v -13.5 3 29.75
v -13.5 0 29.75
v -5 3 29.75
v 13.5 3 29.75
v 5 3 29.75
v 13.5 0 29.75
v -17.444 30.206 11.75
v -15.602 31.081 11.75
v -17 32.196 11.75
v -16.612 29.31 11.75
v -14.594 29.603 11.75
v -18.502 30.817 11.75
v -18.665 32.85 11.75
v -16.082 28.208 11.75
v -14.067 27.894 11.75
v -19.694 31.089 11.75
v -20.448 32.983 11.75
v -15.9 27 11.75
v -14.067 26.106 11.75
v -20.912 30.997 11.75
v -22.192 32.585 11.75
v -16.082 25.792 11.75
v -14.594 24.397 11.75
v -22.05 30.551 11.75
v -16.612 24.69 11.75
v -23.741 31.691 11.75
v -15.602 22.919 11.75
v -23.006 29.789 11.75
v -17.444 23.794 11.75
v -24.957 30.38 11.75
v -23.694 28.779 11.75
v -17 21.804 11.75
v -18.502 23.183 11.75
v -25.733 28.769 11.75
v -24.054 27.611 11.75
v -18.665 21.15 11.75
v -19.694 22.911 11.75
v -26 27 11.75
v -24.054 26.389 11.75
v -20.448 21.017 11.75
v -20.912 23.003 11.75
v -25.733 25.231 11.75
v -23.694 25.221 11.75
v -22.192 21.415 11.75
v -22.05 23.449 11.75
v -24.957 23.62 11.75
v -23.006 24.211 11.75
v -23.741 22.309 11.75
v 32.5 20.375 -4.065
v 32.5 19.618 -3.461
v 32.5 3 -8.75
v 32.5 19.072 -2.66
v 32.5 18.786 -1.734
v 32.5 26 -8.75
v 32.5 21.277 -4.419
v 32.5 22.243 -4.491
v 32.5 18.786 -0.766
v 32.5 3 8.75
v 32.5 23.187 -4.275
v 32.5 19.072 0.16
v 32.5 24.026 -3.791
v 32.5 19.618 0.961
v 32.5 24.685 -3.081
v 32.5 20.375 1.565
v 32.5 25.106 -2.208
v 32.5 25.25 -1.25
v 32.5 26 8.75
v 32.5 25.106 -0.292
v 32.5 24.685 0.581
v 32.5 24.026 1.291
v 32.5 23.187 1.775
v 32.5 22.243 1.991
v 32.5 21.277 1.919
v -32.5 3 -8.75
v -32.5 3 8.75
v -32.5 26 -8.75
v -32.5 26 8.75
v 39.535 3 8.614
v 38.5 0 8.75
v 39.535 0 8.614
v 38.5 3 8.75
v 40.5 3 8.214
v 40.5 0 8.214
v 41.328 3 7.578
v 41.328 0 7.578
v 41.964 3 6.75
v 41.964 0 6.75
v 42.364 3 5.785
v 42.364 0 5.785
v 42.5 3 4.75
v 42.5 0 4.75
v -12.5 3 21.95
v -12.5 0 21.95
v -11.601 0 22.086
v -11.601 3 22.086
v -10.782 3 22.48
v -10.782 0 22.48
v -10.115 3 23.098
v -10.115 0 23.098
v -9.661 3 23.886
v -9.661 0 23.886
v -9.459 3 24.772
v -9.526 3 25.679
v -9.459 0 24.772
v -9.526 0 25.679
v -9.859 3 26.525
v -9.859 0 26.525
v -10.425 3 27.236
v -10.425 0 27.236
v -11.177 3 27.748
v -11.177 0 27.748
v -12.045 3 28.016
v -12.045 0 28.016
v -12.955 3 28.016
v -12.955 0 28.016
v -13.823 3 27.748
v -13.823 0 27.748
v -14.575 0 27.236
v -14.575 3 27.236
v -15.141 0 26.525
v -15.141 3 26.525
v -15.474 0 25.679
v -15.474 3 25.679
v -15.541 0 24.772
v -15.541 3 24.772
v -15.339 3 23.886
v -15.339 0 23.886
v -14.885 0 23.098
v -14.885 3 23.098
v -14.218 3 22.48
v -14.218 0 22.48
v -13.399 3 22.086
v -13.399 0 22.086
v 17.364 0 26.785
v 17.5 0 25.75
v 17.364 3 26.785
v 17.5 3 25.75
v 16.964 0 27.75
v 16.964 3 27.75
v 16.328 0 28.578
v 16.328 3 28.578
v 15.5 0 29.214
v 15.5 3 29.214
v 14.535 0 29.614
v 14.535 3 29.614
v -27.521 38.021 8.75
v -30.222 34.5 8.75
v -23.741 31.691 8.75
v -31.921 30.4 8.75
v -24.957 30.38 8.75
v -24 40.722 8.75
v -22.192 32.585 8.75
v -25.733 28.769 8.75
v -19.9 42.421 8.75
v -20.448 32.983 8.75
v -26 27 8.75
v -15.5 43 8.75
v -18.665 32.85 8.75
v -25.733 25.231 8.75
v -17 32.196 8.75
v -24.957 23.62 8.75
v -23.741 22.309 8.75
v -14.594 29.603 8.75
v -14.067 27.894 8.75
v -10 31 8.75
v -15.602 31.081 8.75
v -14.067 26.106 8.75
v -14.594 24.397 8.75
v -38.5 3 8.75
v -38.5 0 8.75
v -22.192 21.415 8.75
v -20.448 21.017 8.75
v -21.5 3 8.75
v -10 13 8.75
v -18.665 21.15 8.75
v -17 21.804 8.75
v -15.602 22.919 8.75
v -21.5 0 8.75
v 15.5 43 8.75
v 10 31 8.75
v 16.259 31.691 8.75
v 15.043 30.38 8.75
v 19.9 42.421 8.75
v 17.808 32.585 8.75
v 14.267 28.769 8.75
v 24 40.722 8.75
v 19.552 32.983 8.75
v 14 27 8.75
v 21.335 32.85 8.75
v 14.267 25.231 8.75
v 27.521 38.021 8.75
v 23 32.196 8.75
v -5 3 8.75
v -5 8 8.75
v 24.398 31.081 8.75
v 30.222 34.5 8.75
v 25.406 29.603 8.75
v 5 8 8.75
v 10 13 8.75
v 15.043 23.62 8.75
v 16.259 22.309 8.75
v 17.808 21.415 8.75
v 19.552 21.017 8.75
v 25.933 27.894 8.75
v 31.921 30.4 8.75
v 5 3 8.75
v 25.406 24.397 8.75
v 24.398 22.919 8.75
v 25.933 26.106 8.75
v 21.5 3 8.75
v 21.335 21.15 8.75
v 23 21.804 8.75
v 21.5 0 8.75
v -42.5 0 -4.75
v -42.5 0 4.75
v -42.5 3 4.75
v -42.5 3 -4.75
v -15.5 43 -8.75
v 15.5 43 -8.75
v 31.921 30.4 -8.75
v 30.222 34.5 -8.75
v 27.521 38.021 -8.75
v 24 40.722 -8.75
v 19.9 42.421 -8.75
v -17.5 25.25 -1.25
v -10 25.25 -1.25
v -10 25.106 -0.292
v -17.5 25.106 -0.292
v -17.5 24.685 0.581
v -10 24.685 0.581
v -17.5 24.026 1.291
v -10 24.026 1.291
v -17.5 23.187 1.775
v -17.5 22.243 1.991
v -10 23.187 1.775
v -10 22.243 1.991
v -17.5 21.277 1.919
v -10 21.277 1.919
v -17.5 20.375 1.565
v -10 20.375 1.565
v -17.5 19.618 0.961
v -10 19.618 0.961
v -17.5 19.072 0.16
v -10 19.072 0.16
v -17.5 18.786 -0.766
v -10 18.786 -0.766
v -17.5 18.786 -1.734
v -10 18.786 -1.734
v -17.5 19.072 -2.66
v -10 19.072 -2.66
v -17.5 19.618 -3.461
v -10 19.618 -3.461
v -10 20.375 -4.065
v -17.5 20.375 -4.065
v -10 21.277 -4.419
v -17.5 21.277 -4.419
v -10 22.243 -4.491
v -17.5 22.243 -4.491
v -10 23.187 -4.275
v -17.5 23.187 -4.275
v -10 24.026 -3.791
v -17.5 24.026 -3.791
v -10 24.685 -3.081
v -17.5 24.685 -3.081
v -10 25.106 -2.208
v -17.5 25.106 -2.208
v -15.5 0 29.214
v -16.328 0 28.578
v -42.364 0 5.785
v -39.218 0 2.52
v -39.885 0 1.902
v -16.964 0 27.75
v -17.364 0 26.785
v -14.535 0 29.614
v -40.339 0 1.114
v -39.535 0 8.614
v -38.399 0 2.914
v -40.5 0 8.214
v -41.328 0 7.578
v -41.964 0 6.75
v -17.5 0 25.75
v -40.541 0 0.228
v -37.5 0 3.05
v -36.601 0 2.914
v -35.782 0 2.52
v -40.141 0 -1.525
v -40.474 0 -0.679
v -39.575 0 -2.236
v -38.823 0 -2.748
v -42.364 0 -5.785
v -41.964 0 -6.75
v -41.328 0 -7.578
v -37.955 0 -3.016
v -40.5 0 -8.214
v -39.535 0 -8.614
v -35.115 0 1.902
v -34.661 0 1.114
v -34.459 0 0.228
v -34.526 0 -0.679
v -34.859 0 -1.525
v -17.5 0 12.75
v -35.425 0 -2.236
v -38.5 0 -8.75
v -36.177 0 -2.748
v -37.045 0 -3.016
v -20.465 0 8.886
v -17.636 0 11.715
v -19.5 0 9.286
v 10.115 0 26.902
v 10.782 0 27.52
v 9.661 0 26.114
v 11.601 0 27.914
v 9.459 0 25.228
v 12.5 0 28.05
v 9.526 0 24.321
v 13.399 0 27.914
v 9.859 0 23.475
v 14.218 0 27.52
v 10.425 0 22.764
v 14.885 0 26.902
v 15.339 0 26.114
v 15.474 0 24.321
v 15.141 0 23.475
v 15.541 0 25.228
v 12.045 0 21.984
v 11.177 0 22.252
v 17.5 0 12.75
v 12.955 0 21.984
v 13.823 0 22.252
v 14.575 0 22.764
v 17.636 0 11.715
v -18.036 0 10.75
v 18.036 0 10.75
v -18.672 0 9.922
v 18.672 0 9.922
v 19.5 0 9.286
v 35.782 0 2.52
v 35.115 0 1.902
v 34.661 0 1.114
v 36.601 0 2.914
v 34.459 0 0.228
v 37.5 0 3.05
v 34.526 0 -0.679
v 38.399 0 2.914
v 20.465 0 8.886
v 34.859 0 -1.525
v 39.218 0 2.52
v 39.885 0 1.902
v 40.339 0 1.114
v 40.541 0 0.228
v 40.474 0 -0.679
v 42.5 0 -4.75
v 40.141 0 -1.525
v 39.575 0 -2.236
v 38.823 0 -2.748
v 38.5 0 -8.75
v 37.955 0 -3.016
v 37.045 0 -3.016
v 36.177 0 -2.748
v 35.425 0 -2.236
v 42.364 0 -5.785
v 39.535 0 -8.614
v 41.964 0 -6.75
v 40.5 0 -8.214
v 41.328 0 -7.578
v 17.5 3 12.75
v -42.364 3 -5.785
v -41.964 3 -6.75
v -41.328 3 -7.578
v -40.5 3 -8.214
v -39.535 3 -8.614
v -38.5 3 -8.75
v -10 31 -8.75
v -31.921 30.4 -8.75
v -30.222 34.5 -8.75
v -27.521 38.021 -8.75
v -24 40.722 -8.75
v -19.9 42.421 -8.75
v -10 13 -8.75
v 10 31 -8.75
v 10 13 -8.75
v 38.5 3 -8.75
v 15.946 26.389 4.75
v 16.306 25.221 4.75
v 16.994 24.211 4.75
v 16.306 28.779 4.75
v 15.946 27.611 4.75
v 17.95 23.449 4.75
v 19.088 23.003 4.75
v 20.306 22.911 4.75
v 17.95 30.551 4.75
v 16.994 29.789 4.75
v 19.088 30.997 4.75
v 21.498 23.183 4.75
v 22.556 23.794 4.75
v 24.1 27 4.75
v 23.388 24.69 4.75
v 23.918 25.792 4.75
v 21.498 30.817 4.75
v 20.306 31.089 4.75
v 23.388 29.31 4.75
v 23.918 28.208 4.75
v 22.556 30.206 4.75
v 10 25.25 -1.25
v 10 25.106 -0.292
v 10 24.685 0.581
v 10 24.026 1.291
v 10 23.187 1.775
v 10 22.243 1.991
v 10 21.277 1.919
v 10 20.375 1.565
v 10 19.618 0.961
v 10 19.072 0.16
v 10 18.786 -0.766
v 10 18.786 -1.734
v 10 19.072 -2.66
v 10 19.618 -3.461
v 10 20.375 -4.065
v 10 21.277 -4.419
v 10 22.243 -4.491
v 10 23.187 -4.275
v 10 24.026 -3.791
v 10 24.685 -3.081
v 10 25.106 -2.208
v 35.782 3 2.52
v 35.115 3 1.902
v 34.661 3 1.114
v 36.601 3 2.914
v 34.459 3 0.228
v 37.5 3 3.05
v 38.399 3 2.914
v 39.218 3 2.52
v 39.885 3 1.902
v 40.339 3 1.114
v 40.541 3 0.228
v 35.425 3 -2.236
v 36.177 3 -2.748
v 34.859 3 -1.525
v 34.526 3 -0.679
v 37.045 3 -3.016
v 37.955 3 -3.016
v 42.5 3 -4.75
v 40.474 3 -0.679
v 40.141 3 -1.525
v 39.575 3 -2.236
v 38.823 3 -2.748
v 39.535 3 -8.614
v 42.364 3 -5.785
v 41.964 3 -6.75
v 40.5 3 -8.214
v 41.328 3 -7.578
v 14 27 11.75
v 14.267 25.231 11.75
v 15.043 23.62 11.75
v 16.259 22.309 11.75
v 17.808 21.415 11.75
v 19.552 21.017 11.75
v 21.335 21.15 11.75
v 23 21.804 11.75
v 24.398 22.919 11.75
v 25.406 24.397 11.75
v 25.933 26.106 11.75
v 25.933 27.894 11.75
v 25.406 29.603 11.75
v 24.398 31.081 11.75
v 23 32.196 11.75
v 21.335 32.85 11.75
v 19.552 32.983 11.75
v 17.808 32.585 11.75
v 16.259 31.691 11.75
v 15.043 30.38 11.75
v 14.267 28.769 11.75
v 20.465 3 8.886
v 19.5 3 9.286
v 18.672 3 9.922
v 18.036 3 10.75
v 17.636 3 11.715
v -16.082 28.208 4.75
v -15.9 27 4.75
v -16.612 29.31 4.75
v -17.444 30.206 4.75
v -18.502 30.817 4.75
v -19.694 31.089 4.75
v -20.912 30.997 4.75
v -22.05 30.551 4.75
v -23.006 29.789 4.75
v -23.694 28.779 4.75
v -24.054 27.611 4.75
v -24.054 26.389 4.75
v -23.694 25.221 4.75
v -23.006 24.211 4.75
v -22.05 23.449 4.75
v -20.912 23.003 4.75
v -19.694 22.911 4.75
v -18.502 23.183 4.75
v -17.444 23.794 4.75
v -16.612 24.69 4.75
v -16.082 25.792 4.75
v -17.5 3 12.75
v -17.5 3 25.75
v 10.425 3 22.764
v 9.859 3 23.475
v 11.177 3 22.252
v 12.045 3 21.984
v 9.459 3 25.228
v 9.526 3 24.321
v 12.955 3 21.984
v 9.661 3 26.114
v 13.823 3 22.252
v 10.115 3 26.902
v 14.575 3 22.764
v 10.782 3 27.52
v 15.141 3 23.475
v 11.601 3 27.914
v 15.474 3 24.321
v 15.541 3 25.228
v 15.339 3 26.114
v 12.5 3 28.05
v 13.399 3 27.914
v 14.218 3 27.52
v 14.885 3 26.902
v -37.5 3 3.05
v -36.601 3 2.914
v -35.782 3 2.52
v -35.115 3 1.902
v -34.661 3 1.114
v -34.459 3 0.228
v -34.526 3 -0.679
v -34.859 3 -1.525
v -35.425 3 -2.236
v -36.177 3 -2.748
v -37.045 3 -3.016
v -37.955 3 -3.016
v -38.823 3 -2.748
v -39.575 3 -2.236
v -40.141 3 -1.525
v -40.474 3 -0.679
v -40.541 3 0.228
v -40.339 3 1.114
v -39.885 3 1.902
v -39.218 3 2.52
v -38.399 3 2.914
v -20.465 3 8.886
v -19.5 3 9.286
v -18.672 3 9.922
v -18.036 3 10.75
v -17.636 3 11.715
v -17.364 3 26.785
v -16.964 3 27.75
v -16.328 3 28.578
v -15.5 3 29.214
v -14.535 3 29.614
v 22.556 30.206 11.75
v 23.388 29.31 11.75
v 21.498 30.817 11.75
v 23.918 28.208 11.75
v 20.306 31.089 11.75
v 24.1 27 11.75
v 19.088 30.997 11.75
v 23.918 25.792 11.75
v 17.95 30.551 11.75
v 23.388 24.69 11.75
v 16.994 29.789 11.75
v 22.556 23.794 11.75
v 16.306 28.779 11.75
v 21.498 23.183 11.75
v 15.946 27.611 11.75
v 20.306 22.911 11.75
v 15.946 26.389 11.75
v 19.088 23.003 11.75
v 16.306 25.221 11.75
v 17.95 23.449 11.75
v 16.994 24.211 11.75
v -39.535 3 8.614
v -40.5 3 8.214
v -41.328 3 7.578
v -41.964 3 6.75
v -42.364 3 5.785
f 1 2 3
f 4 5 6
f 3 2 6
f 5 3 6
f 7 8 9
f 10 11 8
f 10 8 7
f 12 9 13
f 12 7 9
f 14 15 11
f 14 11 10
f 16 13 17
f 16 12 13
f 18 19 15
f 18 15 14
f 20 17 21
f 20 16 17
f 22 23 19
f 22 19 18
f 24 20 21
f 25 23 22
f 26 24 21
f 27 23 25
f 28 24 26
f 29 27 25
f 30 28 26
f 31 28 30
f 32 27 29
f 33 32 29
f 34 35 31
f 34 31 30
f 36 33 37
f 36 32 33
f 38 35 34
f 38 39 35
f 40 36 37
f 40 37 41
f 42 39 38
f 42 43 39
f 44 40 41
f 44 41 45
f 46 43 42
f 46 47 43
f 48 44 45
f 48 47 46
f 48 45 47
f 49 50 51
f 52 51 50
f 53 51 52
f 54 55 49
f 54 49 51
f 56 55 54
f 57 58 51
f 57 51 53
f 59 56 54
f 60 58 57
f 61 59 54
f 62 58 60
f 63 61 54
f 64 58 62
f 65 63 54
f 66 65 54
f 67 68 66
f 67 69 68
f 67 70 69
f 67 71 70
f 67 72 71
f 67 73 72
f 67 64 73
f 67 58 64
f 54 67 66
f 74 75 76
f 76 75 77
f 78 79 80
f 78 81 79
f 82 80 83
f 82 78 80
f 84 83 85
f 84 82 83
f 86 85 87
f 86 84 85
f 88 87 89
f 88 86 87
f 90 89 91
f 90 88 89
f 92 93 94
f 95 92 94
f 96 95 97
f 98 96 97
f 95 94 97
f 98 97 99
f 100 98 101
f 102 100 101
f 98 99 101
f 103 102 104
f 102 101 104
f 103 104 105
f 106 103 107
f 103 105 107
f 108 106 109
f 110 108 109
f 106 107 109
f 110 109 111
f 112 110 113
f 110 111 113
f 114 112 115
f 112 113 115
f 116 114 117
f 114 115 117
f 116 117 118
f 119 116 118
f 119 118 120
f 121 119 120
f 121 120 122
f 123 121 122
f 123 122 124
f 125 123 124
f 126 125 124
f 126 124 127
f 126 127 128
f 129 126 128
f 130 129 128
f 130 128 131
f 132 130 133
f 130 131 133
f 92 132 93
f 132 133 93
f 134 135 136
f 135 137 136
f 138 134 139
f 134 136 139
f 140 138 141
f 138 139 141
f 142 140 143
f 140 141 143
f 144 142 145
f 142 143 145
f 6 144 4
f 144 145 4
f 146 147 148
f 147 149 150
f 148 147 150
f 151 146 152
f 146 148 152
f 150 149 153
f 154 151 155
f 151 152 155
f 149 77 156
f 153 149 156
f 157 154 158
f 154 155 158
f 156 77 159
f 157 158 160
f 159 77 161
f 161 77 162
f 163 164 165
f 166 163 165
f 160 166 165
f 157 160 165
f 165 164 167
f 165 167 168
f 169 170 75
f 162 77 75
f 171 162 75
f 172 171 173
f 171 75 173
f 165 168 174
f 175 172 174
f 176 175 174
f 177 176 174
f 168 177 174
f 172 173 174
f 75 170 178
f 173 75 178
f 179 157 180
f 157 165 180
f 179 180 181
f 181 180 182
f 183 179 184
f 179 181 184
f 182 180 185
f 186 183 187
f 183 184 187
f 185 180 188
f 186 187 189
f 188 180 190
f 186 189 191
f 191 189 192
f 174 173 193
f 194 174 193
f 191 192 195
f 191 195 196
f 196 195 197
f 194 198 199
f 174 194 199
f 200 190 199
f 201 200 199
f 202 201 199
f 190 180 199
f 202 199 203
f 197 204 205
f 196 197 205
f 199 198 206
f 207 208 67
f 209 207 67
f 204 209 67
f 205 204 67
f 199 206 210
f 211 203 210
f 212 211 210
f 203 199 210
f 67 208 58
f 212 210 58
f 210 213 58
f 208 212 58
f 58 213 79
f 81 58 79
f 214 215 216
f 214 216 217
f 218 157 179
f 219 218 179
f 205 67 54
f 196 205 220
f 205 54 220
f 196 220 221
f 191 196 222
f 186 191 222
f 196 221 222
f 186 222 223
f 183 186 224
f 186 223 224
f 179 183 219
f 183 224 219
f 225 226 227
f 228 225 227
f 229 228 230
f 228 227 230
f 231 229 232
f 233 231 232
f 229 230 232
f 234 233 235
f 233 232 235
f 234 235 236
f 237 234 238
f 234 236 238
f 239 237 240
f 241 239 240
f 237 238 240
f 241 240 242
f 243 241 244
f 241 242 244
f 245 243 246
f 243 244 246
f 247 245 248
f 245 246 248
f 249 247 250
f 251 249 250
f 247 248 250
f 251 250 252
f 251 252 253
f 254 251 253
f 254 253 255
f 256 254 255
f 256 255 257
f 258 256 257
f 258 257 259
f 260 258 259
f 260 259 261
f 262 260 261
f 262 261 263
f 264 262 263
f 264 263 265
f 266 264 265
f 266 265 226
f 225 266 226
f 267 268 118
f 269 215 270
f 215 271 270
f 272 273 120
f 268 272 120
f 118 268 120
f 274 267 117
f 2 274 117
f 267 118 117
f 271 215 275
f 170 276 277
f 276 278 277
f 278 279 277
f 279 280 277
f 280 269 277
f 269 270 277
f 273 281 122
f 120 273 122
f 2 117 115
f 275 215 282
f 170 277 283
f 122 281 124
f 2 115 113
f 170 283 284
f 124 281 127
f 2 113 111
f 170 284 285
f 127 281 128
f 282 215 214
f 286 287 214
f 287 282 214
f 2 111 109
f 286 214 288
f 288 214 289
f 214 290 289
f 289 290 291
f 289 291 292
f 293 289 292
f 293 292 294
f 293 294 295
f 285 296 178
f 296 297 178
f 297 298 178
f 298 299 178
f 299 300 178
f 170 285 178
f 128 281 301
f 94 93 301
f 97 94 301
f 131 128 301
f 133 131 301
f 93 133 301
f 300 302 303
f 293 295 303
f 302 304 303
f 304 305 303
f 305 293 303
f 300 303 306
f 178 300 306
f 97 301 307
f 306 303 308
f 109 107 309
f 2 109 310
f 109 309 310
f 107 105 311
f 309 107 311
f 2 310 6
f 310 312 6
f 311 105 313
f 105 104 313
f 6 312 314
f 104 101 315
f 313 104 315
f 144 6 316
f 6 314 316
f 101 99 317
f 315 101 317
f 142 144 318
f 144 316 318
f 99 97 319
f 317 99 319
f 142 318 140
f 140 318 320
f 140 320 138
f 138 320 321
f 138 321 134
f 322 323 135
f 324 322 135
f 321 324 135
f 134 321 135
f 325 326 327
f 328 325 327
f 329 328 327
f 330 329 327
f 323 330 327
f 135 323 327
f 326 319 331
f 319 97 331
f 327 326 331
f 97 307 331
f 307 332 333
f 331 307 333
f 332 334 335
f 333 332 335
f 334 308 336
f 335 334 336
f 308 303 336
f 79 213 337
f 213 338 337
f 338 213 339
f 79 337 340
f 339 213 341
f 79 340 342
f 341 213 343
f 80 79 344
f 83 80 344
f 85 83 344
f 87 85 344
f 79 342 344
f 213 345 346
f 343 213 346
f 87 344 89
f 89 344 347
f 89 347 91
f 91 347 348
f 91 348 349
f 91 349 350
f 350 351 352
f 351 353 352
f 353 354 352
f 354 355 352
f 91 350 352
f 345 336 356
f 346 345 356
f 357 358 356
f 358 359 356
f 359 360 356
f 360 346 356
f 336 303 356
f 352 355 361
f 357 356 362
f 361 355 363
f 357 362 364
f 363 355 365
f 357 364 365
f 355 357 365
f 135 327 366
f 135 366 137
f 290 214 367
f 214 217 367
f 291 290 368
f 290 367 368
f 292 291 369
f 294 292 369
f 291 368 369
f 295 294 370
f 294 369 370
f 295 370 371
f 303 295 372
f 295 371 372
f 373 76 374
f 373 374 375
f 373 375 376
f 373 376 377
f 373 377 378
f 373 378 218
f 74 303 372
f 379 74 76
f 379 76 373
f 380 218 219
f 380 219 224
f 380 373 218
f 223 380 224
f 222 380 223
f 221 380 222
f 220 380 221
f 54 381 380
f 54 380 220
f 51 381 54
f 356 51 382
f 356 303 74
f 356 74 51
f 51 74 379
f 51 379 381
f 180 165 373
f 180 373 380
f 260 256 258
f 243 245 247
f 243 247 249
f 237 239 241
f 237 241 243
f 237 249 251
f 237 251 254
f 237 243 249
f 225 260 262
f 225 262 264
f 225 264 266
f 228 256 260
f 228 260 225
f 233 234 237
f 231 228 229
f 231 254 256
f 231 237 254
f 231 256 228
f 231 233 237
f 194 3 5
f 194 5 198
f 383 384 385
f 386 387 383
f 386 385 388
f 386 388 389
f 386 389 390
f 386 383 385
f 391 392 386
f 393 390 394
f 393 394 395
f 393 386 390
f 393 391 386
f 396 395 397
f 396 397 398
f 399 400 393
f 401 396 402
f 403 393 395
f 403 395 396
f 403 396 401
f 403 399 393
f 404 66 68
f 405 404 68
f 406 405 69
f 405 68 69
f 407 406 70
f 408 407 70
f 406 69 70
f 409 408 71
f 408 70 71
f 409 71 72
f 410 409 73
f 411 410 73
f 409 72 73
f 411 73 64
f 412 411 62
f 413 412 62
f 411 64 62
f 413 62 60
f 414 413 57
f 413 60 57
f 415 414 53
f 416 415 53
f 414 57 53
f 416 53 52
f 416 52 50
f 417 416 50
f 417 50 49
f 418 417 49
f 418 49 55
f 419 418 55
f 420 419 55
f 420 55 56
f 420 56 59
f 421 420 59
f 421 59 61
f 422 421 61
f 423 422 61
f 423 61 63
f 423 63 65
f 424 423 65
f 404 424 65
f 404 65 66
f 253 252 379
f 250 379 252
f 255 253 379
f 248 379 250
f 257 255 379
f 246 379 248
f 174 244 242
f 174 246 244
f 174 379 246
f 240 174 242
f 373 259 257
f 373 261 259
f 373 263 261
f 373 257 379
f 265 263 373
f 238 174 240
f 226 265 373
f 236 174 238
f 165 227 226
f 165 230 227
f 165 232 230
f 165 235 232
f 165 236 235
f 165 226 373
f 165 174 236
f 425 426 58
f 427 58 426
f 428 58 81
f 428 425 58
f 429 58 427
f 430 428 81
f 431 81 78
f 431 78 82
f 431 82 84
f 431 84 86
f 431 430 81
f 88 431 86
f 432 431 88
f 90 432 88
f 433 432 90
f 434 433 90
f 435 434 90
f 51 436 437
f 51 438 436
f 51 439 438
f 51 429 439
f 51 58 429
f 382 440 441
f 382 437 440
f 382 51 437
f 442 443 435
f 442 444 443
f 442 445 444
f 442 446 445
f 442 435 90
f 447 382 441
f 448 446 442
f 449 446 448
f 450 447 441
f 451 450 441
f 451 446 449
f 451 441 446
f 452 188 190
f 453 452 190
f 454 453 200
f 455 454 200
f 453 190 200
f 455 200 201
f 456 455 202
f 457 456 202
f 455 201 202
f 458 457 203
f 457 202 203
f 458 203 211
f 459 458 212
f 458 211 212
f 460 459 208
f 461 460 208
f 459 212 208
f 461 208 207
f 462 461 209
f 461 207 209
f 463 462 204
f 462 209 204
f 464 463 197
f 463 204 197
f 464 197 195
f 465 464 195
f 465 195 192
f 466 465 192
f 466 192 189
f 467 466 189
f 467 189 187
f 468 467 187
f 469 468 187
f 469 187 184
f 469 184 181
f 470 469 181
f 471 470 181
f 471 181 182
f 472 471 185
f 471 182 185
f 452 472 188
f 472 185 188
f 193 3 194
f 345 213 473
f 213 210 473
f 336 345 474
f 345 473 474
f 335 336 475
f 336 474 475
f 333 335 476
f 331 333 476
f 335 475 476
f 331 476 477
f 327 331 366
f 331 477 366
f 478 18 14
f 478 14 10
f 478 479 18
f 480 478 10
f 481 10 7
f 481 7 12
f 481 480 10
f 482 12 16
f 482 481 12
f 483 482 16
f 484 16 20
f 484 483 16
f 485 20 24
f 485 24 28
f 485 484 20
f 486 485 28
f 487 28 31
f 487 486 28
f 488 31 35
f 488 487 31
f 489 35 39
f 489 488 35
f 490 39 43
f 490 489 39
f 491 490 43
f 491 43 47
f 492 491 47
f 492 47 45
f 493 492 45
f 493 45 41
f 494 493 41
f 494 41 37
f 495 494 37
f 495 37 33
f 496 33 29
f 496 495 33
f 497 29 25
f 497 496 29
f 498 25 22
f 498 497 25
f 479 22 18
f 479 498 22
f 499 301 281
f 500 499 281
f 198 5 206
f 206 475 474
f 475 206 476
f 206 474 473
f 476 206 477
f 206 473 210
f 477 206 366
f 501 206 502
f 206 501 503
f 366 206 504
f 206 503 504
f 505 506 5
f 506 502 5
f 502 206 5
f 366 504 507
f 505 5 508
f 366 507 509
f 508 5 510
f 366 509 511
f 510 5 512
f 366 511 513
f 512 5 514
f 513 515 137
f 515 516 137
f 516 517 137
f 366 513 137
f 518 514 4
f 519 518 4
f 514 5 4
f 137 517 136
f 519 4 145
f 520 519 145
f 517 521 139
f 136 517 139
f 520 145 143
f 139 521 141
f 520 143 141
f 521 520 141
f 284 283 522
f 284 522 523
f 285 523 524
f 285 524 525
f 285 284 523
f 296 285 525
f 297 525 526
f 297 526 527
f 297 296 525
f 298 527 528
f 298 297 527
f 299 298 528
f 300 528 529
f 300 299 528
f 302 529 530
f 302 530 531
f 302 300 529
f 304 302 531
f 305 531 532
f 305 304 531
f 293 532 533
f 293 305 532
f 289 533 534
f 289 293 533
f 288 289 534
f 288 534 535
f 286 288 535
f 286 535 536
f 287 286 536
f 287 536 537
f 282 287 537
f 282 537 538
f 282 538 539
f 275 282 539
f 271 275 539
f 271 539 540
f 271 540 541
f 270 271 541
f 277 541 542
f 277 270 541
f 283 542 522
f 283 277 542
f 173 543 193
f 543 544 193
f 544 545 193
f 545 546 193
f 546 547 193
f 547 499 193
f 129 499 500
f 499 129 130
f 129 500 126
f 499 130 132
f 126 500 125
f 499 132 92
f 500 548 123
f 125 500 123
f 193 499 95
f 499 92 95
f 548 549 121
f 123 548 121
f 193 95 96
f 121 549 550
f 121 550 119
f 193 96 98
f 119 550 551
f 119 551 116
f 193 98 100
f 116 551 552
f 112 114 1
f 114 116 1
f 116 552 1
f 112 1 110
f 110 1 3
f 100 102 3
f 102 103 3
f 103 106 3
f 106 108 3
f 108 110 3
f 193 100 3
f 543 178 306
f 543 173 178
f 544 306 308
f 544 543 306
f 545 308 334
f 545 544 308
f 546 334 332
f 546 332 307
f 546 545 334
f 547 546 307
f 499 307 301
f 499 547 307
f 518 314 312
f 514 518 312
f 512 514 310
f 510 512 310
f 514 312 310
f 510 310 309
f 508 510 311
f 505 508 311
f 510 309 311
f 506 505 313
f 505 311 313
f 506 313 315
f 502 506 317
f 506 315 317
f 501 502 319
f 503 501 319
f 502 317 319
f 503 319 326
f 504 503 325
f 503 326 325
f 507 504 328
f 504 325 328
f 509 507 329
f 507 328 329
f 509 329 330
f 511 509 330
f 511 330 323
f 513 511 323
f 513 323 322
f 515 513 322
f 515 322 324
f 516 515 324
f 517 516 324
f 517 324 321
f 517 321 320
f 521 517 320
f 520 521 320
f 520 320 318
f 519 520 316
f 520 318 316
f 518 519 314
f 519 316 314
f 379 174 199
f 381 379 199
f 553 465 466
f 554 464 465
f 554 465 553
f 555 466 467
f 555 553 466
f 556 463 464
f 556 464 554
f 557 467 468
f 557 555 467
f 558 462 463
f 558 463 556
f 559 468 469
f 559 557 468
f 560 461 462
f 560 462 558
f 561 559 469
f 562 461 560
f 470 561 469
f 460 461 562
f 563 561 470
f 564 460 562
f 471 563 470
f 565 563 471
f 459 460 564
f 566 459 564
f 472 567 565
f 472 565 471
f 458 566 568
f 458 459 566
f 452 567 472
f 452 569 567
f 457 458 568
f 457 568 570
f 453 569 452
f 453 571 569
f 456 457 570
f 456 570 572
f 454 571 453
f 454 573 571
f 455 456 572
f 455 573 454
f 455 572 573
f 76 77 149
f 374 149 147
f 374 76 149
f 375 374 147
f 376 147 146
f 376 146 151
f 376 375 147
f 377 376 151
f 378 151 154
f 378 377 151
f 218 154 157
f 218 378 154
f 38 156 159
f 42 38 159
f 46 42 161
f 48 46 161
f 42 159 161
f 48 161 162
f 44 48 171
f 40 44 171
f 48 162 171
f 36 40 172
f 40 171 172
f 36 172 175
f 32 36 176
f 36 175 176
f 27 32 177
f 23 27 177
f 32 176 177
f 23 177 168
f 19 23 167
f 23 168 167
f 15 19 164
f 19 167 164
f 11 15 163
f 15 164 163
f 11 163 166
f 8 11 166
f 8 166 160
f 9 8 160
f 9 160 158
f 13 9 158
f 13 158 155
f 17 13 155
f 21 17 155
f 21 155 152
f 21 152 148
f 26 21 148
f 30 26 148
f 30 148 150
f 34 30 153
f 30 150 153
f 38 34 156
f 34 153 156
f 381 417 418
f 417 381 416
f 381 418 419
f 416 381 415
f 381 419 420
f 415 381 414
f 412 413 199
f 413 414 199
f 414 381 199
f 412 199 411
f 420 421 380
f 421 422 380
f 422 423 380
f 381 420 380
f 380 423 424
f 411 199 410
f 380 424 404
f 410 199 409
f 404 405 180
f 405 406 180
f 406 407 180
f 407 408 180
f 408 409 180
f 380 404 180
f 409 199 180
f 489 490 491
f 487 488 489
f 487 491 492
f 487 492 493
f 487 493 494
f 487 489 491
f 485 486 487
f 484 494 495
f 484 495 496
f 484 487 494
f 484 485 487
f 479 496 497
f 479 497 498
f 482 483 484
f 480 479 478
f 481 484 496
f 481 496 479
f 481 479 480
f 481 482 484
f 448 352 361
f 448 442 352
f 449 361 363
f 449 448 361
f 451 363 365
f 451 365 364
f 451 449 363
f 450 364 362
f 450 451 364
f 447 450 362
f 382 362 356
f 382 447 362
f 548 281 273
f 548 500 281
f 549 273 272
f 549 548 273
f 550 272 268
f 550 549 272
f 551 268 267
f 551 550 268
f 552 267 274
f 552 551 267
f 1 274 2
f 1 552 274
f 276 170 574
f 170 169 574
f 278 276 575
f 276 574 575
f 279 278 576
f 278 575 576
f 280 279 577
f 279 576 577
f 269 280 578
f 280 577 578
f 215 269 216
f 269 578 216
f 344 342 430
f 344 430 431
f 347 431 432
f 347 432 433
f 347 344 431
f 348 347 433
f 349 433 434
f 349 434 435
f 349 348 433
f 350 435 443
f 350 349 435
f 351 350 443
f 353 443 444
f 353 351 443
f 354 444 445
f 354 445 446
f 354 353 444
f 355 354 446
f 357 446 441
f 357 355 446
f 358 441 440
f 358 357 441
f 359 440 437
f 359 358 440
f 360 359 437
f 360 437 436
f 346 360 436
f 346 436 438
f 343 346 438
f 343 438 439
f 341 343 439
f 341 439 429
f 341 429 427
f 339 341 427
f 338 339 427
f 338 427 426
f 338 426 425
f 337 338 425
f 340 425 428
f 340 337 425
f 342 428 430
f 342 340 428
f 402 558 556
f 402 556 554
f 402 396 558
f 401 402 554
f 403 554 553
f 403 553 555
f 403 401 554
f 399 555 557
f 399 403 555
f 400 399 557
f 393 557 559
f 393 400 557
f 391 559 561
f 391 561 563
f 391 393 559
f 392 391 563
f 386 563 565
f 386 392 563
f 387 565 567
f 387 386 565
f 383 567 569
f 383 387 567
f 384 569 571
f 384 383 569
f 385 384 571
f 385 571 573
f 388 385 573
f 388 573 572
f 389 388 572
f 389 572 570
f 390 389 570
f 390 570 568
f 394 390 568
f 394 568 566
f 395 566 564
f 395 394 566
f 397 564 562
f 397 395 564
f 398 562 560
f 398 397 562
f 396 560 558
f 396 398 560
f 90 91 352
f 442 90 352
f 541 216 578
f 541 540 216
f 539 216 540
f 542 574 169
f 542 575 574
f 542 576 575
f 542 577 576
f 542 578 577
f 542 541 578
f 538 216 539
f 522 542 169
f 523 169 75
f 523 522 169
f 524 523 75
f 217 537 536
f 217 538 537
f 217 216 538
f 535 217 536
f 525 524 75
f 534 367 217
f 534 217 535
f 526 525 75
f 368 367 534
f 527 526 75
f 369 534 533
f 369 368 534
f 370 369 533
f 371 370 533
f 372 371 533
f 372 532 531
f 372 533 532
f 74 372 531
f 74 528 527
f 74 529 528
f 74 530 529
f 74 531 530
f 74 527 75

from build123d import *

# Parameters (mm, degrees)
SKICA1_W                 = 85
SKICA1_H                 = 17.5
SKICA1_R                 = 3.05
P_IDAT_VYSUNUT_M1_DEPTH  = 3
SKICA3_W                 = 65
SKICA3_H                 = 40
P_IDAT_VYSUNUT_M2_DEPTH  = 17.5
ZAOBLIT2_R               = 17
SKICA4_R                 = 6
SKICA4_R_2               = 4.1
P_IDAT_VYSUNUT_M3_DEPTH  = 3
ODEBRAT_START            = -4
SKICA4_2_R               = 4.1
ODEBRAT_VYSUNUT_M1_DEPTH = 4
SKICA5_W                 = 20
SKICA5_H                 = 18
ODEBRAT_VYSUNUT_M2_DEPTH = 63.940448044
SKICA7_R                 = 3.25
ODEBRAT_VYSUNUT_M4_DEPTH = 50
SKICA8_W                 = 35
SKICA8_H                 = 21
SKICA8_R                 = 3.05
P_IDAT_VYSUNUT_M4_DEPTH  = 3
ZAOBLIT1_R               = 4
EBRO4_REACH              = 69.382
SKICA12_WALL_W           = 158.350715196
SKICA12_WALL_H           = 10


with BuildPart() as part:
    # Skica1 → P_idat vysunut_m1 (new body)
    with BuildSketch(Plane(origin=(0, 0, 0), x_dir=(1, 0, 0), z_dir=(0, 1, 0))):
        Rectangle(SKICA1_W, SKICA1_H)
        with Locations((-37.5, 0)):
            Circle(SKICA1_R, mode=Mode.SUBTRACT)
        with Locations((37.5, 0)):
            Circle(SKICA1_R, mode=Mode.SUBTRACT)
    extrude(amount=P_IDAT_VYSUNUT_M1_DEPTH)

    # Skica3 → P_idat vysunut_m2 (add)
    with BuildSketch(Plane.XY.offset(8.75)):
        with Locations((0, 23)):
            Rectangle(SKICA3_W, SKICA3_H)
    extrude(amount=-P_IDAT_VYSUNUT_M2_DEPTH)

    # Zaoblit2
    zaoblit2_edges = [part.edges().sort_by_distance(p)[0] for p in [
        (-32.5, 43, 0),
        (32.5, 43, 0),
    ]]
    fillet(zaoblit2_edges, radius=ZAOBLIT2_R)

    # Skica4 → P_idat vysunut_m3 (add)
    # profile 1 of 2: a face of its own
    with BuildSketch(Plane.XY.offset(8.75)):
        with Locations((-20, 27)):
            Circle(SKICA4_R)
        with Locations((-20, 27)):
            Circle(SKICA4_R_2, mode=Mode.SUBTRACT)
    # profile 2 of 2: a face of its own
    with BuildSketch(Plane.XY.offset(8.75)):
        with Locations((20, 27)):
            Circle(SKICA4_R)
        with Locations((20, 27)):
            Circle(SKICA4_R_2, mode=Mode.SUBTRACT)
    extrude(amount=P_IDAT_VYSUNUT_M3_DEPTH)

    # Skica4_2 → Odebrat vysunut_m1 (cut)
    with BuildSketch(Plane.XY.offset(8.75).offset(ODEBRAT_START)):
        with Locations((-20, 27)):
            Circle(SKICA4_2_R)
        with Locations((20, 27)):
            Circle(SKICA4_2_R)
    extrude(amount=ODEBRAT_VYSUNUT_M1_DEPTH, mode=Mode.SUBTRACT)

    # Skica5 → Odebrat vysunut_m2 (cut, through all)
    with BuildSketch(Plane.XY.offset(8.75)):
        with Locations((0, 22)):
            Rectangle(SKICA5_W, SKICA5_H)
    extrude(amount=-ODEBRAT_VYSUNUT_M2_DEPTH, mode=Mode.SUBTRACT)

    # Skica7 → Odebrat vysunut_m4 (cut)
    with BuildSketch(Plane(origin=(32.5, 0, 0), x_dir=(0, 0, -1), z_dir=(1, 0, 0))):
        with Locations((1.25, 22)):
            Circle(SKICA7_R)
    extrude(amount=-ODEBRAT_VYSUNUT_M4_DEPTH, mode=Mode.SUBTRACT)

    # Skica8 → P_idat vysunut_m4 (add)
    with BuildSketch(Plane.XZ):
        with Locations((0, 19.25)):
            Rectangle(SKICA8_W, SKICA8_H)
        with Locations((-12.5, 25)):
            Circle(SKICA8_R, mode=Mode.SUBTRACT)
        with Locations((12.5, 25)):
            Circle(SKICA8_R, mode=Mode.SUBTRACT)
    extrude(amount=-P_IDAT_VYSUNUT_M4_DEPTH)

    # Zaoblit1
    zaoblit1_edges = [part.edges().sort_by_distance(p)[0] for p in [
        (42.5, 1.5, 8.75),
        (42.5, 1.5, -8.75),
        (-42.5, 1.5, -8.75),
        (-42.5, 1.5, 8.75),
        (17.5, 1.5, 8.75),
        (-17.5, 1.5, 8.75),
        (-17.5, 1.5, 29.75),
        (17.5, 1.5, 29.75),
    ]]
    fillet(zaoblit1_edges, radius=ZAOBLIT1_R)

    # Skica12 wall → ebro4 (add, up to next)
    with BuildSketch(Plane(origin=(0, 5.5, 19.25), x_dir=(0, 0.231620527306, -0.972806214685), z_dir=(0, 0.972806214685, 0.231620527306)), mode=Mode.PRIVATE) as ebro4_sk1:
        Rectangle(SKICA12_WALL_W, SKICA12_WALL_H)
    ebro4_tool1 = extrude(ebro4_sk1.sketch, amount=-EBRO4_REACH, mode=Mode.PRIVATE) - part.part
    add(ebro4_tool1.solids().sort_by_distance((0, 5.5, 19.25))[0])


solid = part.part
